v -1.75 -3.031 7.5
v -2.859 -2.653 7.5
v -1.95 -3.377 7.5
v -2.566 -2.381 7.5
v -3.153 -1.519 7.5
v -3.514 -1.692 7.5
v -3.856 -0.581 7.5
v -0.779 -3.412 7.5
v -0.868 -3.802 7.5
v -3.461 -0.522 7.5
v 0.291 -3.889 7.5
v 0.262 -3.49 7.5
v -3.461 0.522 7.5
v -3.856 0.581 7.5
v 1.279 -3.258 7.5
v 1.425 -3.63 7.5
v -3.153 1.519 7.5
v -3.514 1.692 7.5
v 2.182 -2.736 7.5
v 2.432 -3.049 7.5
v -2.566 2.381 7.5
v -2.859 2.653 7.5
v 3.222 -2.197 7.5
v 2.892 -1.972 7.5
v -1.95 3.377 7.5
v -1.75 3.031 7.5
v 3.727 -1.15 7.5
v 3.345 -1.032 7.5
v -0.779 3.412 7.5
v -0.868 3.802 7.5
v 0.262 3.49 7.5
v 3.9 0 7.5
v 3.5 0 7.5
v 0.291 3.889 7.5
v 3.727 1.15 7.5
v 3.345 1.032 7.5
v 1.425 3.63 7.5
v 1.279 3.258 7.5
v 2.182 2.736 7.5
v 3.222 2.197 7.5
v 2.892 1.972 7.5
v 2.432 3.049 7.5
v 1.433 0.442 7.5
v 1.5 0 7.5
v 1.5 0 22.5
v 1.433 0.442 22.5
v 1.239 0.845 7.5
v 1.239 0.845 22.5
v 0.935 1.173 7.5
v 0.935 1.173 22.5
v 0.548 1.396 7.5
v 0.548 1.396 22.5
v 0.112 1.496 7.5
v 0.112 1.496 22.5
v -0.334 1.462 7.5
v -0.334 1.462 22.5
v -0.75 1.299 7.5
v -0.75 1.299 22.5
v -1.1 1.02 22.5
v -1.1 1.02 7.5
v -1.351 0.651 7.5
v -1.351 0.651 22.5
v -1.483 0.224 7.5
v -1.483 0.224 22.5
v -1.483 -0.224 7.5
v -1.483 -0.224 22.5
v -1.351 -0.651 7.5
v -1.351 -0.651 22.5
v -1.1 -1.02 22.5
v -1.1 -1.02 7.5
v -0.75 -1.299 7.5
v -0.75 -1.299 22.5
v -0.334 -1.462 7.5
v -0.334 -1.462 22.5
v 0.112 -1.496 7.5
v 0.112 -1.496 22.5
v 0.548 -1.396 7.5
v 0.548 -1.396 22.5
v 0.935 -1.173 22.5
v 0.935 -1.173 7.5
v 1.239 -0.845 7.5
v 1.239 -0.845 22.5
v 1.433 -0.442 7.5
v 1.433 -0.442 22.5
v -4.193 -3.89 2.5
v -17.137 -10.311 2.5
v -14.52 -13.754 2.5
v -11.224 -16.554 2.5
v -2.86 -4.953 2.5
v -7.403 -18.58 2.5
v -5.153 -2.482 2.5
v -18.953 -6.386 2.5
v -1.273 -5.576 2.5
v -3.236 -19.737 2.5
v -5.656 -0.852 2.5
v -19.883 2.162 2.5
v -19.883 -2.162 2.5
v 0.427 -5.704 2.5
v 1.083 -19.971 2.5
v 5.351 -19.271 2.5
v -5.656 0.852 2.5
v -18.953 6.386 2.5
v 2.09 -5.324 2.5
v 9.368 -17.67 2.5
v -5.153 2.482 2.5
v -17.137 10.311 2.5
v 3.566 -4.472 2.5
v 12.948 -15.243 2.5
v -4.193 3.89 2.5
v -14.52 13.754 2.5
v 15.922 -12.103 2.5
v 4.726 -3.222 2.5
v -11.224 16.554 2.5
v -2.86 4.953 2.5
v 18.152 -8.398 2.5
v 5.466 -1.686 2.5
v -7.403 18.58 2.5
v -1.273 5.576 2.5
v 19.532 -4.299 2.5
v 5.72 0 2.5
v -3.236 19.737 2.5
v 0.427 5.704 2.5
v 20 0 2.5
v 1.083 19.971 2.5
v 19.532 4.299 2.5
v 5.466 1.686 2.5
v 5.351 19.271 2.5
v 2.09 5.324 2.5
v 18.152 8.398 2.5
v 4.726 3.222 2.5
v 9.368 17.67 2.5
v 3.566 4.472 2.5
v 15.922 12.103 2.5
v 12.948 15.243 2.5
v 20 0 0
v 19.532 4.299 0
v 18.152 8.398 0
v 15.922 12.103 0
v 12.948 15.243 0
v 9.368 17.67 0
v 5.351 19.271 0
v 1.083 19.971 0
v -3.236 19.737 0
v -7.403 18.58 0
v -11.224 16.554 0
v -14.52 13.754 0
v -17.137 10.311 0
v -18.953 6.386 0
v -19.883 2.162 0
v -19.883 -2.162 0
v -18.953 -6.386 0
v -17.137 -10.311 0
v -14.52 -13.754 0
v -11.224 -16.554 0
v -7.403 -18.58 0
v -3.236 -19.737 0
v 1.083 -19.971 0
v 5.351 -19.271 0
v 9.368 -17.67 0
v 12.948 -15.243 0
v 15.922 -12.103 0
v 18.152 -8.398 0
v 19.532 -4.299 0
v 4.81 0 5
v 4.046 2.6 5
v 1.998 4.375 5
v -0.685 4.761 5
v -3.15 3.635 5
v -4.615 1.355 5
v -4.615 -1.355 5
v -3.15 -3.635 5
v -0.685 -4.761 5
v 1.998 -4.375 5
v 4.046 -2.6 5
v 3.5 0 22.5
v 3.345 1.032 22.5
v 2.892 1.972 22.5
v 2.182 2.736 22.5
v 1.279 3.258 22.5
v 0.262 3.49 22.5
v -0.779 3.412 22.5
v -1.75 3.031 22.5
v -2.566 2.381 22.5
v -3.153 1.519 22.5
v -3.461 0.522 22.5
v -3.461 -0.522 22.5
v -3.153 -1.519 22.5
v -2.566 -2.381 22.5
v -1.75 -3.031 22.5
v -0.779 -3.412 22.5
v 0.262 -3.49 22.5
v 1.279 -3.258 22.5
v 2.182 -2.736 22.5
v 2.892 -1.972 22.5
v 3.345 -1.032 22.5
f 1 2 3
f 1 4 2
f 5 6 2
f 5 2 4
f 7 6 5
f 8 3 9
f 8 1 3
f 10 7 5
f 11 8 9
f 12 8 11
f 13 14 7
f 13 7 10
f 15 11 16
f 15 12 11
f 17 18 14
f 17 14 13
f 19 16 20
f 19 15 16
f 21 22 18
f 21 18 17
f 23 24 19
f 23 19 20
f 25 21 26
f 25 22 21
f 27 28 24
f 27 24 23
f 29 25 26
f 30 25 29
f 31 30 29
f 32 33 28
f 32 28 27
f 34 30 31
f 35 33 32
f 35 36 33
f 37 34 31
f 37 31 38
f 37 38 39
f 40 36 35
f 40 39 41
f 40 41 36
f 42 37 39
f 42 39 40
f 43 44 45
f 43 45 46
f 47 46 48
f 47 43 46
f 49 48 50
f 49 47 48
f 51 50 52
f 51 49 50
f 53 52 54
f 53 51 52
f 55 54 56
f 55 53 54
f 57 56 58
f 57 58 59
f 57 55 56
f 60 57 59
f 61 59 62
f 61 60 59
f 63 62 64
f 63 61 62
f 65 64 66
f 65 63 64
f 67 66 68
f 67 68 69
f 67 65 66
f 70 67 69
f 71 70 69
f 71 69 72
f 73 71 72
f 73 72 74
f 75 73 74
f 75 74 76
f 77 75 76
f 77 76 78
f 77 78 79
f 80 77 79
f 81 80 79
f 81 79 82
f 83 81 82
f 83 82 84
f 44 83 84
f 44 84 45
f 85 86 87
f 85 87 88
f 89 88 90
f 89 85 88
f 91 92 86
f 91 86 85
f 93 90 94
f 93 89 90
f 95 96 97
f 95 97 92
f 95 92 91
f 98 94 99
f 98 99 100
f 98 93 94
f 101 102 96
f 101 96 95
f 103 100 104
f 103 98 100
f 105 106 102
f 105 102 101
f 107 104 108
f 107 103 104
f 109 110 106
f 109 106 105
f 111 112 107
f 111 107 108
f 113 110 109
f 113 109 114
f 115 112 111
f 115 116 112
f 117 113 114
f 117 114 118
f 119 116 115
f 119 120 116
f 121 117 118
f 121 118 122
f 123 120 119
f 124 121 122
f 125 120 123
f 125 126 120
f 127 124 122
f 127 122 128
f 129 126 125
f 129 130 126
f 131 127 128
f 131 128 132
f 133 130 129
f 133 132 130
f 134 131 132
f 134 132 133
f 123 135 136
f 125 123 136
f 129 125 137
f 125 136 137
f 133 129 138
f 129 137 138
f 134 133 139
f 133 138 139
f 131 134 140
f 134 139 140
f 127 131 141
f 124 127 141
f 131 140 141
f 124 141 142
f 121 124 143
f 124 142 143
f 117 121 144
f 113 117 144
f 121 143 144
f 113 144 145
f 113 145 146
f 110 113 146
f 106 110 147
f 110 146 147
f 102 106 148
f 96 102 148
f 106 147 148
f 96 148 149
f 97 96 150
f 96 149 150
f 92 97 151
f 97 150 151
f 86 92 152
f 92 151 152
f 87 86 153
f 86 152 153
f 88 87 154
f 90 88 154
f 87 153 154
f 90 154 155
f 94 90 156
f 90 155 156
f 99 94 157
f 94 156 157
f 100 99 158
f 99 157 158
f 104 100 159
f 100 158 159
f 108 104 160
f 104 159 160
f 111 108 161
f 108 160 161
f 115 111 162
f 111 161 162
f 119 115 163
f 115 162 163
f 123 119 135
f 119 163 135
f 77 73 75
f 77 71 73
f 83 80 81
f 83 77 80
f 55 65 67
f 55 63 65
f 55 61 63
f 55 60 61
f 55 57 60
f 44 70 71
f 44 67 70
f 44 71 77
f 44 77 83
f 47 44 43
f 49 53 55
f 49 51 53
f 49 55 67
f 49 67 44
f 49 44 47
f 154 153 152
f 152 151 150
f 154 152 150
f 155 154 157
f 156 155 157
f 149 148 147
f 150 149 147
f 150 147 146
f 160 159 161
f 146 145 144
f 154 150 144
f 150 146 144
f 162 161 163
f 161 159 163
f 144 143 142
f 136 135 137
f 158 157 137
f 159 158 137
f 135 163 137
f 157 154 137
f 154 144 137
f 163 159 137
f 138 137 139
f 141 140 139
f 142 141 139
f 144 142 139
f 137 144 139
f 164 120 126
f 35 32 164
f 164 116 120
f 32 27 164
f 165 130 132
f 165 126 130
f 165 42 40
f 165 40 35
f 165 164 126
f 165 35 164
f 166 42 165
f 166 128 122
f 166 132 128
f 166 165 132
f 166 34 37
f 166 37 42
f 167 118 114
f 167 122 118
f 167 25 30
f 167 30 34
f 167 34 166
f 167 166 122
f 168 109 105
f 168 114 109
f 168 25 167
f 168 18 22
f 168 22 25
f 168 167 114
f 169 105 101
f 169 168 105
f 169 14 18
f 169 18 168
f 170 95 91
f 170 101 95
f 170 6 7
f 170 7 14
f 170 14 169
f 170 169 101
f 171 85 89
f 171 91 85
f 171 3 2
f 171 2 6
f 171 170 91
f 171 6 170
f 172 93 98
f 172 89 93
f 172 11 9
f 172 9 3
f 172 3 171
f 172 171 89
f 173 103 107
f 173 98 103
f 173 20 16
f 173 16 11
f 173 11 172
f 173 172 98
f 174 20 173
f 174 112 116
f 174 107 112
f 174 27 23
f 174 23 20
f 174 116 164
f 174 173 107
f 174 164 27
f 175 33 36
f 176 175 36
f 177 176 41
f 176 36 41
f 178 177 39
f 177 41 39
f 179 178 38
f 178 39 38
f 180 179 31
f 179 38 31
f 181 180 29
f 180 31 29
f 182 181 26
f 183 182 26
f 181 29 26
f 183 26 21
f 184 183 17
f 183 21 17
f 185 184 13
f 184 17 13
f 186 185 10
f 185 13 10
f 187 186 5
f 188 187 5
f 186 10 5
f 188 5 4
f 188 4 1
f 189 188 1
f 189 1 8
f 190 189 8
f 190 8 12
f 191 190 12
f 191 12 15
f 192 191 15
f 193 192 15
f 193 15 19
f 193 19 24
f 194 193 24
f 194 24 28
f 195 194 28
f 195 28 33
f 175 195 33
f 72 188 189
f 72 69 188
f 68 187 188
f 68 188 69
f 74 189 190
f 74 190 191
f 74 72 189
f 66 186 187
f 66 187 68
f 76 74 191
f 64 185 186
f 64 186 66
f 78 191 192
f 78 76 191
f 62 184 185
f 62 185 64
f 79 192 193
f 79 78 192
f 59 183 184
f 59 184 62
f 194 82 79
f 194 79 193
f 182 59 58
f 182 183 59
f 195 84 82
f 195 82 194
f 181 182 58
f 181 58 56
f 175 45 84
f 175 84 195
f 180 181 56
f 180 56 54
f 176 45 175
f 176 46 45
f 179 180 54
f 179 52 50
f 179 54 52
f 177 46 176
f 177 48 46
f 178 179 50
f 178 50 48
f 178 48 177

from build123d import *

# Parameters (mm, degrees)
F0_R     = 20
F1_DEPTH = 2.5
F2_R     = 3.5
F2_R_2   = 1.5
F3_DEPTH = 20
F4_R     = 5.7197863804
F4_R_2   = 3.5
F5_DEPTH = 5
F5_TAPER = 20


with BuildPart() as f1:
    # F0 (on Top) → F1 (new body)
    with BuildSketch(Plane.XY):
        Circle(F0_R)
    extrude(amount=F1_DEPTH)

    # F2 (on face) → F3 (join)
    with BuildSketch(Plane.XY.offset(2.5)):
        Circle(F2_R)
        Circle(F2_R_2, mode=Mode.SUBTRACT)
    extrude(amount=F3_DEPTH)

    # F4 (on face) → F5 (join)
    with BuildSketch(Plane.XY.offset(2.5)):
        Circle(F4_R)
        Circle(F4_R_2, mode=Mode.SUBTRACT)
        Circle(F4_R_2)
    extrude(amount=F5_DEPTH, taper=F5_TAPER)


solid = f1.part
